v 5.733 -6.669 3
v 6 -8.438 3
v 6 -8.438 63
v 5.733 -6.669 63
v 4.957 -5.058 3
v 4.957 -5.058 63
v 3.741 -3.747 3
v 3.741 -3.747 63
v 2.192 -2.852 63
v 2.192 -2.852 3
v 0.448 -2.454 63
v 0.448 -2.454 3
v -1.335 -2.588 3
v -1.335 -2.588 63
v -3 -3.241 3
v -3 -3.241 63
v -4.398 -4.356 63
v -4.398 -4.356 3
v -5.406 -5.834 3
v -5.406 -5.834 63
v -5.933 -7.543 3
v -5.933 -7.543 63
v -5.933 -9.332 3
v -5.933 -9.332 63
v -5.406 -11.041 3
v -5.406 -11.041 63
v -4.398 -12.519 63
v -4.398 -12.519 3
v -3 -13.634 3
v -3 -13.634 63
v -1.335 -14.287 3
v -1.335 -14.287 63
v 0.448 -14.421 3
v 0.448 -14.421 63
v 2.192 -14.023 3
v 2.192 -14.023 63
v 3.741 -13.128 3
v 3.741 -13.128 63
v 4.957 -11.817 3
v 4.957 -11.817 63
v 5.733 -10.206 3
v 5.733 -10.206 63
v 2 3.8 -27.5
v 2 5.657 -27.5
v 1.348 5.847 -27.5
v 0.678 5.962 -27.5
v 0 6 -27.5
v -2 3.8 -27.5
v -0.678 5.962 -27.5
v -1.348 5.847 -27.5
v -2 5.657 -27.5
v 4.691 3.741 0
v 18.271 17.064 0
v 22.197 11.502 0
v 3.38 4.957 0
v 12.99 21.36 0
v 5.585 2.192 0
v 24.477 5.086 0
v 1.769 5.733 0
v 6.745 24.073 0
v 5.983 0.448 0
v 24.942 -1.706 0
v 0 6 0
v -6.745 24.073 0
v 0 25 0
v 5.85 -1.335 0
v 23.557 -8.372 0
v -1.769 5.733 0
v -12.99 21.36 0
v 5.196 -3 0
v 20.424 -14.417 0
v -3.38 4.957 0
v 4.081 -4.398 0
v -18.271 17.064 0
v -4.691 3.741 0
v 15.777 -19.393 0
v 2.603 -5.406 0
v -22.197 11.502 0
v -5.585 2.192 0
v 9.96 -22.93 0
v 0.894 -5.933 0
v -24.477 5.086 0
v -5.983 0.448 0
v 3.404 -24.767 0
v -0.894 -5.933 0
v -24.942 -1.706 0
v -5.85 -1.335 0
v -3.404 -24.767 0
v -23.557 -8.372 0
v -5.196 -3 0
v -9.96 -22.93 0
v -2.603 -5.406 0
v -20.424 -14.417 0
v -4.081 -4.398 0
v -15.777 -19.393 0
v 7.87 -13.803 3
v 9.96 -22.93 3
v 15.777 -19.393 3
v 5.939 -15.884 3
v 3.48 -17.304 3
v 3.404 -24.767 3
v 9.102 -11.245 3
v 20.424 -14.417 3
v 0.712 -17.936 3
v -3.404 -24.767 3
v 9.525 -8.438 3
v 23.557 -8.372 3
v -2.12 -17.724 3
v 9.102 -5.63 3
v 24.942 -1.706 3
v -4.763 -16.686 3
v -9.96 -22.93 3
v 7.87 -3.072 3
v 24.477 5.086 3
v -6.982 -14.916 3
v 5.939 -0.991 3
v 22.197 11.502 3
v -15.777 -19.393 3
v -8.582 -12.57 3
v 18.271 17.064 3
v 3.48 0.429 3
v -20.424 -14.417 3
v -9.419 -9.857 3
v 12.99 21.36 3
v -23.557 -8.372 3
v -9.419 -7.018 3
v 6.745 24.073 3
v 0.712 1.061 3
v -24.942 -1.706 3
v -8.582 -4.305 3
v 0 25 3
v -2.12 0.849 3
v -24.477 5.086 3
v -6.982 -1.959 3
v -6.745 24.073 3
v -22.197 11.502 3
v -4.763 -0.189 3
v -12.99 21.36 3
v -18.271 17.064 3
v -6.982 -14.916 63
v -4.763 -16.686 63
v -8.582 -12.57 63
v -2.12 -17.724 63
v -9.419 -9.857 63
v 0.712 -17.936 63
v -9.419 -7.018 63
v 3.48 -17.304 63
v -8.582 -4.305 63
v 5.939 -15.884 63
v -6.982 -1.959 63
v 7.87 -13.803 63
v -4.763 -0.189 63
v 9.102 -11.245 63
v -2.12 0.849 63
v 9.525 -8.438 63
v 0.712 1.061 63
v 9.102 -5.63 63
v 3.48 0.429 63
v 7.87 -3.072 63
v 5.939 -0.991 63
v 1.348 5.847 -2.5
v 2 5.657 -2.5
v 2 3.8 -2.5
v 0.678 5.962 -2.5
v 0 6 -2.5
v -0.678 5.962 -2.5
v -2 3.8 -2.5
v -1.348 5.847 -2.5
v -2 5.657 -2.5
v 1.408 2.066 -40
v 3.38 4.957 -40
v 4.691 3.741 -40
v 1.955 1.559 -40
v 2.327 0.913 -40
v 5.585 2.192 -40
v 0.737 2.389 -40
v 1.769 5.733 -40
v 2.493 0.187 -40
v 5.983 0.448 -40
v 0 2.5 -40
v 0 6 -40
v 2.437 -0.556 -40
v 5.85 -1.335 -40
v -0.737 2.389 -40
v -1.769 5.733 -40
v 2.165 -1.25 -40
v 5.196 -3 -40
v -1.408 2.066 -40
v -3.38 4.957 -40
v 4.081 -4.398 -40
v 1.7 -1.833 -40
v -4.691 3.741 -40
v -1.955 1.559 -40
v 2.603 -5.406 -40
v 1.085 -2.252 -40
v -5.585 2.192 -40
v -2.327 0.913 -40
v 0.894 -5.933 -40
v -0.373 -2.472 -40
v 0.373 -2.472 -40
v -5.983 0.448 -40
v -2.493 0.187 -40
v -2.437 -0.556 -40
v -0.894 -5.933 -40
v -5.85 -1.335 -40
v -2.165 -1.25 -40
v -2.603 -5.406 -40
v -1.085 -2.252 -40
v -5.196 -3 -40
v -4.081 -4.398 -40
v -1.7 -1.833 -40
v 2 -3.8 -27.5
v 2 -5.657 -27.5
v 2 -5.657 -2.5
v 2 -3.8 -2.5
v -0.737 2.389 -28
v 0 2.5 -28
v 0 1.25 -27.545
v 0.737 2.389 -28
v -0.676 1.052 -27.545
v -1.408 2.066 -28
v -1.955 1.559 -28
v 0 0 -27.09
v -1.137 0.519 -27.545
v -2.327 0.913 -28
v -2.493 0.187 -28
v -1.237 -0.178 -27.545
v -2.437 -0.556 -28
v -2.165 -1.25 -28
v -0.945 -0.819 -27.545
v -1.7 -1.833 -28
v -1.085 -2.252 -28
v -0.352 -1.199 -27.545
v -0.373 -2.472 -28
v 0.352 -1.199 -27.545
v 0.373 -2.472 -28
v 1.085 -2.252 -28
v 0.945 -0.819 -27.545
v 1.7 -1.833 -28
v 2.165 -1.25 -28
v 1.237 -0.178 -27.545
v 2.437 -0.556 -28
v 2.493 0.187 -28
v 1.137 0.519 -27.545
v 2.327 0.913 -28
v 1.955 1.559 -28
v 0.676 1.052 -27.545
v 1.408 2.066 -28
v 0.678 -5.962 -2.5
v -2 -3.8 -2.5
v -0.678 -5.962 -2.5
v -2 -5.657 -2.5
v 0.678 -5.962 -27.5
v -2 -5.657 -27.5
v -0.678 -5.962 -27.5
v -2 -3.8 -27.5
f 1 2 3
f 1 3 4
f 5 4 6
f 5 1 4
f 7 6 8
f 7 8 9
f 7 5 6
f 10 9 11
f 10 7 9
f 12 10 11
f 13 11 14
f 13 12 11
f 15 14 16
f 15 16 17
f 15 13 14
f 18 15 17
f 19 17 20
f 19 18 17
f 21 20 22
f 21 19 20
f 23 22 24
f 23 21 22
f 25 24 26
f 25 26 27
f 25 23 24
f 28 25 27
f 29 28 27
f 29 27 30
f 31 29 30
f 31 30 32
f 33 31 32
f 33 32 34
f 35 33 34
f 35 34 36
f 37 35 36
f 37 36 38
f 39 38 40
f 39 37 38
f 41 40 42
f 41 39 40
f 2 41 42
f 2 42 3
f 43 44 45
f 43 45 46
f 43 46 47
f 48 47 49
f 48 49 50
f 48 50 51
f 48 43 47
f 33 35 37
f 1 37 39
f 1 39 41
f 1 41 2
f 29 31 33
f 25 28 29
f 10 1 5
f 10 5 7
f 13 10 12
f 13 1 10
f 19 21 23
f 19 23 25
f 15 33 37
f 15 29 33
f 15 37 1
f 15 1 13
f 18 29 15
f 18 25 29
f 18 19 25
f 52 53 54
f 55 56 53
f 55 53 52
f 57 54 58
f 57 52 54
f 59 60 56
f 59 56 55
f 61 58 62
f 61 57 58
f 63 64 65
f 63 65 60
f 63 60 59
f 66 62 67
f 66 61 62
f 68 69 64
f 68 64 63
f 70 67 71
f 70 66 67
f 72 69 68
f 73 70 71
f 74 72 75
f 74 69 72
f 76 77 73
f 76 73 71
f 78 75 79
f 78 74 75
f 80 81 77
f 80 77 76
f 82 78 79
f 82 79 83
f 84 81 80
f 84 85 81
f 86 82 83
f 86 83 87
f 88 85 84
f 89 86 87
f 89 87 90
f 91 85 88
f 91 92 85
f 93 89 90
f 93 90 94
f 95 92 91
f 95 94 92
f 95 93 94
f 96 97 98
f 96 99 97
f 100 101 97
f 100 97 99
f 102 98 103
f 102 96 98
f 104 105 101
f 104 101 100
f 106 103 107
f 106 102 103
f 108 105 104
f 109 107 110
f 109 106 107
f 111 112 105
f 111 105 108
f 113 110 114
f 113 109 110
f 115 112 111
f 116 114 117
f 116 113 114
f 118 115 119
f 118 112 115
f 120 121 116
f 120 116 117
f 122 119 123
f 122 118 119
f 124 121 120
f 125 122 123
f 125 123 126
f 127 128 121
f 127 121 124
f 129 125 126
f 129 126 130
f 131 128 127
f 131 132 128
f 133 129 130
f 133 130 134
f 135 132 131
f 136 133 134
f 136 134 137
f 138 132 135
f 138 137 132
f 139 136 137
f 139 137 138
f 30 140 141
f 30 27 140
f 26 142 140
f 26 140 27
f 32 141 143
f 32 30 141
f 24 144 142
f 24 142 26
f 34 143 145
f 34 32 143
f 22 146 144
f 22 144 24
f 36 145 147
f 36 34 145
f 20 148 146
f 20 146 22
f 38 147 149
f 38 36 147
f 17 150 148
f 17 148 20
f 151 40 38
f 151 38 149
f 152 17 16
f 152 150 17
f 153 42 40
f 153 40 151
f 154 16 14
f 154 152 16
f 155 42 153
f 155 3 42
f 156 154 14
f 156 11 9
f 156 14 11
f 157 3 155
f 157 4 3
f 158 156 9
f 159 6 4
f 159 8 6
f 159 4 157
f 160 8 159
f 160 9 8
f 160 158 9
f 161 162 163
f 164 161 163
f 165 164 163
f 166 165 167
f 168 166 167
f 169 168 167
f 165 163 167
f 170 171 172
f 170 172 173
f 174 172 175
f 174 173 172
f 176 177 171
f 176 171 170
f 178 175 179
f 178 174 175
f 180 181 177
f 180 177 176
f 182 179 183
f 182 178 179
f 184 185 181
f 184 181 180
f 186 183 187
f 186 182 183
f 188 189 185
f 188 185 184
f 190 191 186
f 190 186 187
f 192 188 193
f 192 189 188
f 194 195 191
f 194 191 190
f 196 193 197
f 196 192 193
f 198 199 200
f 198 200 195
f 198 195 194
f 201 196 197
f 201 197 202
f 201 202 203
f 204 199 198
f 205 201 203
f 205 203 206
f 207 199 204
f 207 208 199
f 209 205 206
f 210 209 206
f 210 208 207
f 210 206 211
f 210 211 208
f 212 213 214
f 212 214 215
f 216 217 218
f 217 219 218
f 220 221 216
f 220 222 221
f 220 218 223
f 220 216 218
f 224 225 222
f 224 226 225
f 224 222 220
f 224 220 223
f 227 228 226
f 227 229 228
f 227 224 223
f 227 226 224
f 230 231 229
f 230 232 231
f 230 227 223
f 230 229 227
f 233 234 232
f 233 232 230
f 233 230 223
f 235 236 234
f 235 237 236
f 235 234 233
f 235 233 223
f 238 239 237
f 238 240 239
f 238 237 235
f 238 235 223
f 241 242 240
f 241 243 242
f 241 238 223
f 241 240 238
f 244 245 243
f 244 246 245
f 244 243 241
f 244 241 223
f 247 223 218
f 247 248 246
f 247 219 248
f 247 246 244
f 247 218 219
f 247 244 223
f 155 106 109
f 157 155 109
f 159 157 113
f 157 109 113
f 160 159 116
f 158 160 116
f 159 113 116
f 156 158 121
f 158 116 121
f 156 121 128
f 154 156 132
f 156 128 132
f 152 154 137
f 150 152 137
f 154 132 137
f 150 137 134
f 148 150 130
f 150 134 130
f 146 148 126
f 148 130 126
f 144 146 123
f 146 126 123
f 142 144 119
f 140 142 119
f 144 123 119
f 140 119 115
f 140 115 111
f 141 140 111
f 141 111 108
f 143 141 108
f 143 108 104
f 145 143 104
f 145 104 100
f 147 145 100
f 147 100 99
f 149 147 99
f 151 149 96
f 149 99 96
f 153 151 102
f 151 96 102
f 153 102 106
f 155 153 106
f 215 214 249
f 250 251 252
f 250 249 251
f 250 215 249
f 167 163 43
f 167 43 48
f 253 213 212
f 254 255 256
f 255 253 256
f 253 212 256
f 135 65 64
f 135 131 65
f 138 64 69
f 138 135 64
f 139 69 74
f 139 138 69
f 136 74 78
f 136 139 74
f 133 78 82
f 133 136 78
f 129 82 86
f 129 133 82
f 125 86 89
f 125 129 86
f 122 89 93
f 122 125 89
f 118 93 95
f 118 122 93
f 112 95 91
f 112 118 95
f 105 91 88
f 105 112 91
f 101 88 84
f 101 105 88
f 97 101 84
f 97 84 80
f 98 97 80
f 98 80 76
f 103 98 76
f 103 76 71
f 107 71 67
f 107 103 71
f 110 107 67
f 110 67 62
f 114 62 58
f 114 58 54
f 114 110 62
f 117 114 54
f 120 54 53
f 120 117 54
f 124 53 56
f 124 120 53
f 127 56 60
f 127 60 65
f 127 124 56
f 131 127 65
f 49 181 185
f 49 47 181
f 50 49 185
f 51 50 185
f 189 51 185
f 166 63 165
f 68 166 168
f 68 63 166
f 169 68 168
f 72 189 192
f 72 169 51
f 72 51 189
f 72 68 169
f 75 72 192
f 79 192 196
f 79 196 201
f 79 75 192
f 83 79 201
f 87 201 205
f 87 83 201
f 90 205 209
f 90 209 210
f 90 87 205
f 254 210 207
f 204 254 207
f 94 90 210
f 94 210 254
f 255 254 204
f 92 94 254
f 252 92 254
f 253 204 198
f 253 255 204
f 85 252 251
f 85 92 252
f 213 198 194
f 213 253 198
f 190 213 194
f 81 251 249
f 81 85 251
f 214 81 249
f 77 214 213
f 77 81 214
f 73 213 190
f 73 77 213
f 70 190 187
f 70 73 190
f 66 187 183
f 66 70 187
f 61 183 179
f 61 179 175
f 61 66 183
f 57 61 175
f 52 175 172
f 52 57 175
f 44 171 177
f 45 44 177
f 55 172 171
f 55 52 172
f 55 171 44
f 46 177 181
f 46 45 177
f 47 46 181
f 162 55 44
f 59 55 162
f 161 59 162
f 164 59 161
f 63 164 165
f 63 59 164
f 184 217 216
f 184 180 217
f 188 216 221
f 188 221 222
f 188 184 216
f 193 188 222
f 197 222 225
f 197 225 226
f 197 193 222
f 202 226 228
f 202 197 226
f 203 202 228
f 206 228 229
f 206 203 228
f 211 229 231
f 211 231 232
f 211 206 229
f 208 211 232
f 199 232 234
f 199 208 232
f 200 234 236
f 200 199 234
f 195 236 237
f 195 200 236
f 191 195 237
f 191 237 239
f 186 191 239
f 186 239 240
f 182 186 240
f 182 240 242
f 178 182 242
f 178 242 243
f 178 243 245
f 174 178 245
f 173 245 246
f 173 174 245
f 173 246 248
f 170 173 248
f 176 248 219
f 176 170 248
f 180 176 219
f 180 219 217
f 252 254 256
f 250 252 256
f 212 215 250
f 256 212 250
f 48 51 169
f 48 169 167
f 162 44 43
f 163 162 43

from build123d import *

# Parameters (mm, degrees)
SKETCH2_R           = 9.525
SKETCH2_R_2         = 6
BOSS_EXTRUDE1_DEPTH = 60
CUT_EXTRUDE1_START  = 2.5
SKETCH5_W           = 4
SKETCH5_H           = 4
CUT_EXTRUDE1_DEPTH  = 25


with BuildPart() as part:
    # Sketch1 → Revolve1 (revolve)
    with BuildSketch(Plane(origin=(0, 0, 0), x_dir=(0, 0, -1), z_dir=(1, 0, 0))):
        Polygon((0, 6), (0, 25), (-3, 25), (-3, 0), (27.090074414, 0), (28, 2.5), (40, 2.5), (40, 6), align=None)
    revolve(axis=Axis((0, 0, -27.090074414), (0, 0, 1)))

    # Sketch2 → Boss-Extrude1 (add)
    with BuildSketch(Plane.XY.offset(3)):
        with Locations((0, -8.4375)):
            Circle(SKETCH2_R)
        with Locations((0, -8.4375)):
            Circle(SKETCH2_R_2, mode=Mode.SUBTRACT)
    extrude(amount=BOSS_EXTRUDE1_DEPTH)

    # Sketch5 → Cut-Extrude1 (cut)
    with BuildSketch(Plane(origin=(0, 0, 0), x_dir=(-1, 0, 0), z_dir=(0, 0, -1)).offset(CUT_EXTRUDE1_START)):
        with Locations((0, -5.8)):
            Rectangle(SKETCH5_W, SKETCH5_H)
    cut_extrude1 = extrude(amount=CUT_EXTRUDE1_DEPTH, mode=Mode.SUBTRACT)

    # Mirror1: Cut-Extrude1 across plane
    add(cut_extrude1.mirror(Plane.ZX), mode=Mode.SUBTRACT)


solid = part.part
